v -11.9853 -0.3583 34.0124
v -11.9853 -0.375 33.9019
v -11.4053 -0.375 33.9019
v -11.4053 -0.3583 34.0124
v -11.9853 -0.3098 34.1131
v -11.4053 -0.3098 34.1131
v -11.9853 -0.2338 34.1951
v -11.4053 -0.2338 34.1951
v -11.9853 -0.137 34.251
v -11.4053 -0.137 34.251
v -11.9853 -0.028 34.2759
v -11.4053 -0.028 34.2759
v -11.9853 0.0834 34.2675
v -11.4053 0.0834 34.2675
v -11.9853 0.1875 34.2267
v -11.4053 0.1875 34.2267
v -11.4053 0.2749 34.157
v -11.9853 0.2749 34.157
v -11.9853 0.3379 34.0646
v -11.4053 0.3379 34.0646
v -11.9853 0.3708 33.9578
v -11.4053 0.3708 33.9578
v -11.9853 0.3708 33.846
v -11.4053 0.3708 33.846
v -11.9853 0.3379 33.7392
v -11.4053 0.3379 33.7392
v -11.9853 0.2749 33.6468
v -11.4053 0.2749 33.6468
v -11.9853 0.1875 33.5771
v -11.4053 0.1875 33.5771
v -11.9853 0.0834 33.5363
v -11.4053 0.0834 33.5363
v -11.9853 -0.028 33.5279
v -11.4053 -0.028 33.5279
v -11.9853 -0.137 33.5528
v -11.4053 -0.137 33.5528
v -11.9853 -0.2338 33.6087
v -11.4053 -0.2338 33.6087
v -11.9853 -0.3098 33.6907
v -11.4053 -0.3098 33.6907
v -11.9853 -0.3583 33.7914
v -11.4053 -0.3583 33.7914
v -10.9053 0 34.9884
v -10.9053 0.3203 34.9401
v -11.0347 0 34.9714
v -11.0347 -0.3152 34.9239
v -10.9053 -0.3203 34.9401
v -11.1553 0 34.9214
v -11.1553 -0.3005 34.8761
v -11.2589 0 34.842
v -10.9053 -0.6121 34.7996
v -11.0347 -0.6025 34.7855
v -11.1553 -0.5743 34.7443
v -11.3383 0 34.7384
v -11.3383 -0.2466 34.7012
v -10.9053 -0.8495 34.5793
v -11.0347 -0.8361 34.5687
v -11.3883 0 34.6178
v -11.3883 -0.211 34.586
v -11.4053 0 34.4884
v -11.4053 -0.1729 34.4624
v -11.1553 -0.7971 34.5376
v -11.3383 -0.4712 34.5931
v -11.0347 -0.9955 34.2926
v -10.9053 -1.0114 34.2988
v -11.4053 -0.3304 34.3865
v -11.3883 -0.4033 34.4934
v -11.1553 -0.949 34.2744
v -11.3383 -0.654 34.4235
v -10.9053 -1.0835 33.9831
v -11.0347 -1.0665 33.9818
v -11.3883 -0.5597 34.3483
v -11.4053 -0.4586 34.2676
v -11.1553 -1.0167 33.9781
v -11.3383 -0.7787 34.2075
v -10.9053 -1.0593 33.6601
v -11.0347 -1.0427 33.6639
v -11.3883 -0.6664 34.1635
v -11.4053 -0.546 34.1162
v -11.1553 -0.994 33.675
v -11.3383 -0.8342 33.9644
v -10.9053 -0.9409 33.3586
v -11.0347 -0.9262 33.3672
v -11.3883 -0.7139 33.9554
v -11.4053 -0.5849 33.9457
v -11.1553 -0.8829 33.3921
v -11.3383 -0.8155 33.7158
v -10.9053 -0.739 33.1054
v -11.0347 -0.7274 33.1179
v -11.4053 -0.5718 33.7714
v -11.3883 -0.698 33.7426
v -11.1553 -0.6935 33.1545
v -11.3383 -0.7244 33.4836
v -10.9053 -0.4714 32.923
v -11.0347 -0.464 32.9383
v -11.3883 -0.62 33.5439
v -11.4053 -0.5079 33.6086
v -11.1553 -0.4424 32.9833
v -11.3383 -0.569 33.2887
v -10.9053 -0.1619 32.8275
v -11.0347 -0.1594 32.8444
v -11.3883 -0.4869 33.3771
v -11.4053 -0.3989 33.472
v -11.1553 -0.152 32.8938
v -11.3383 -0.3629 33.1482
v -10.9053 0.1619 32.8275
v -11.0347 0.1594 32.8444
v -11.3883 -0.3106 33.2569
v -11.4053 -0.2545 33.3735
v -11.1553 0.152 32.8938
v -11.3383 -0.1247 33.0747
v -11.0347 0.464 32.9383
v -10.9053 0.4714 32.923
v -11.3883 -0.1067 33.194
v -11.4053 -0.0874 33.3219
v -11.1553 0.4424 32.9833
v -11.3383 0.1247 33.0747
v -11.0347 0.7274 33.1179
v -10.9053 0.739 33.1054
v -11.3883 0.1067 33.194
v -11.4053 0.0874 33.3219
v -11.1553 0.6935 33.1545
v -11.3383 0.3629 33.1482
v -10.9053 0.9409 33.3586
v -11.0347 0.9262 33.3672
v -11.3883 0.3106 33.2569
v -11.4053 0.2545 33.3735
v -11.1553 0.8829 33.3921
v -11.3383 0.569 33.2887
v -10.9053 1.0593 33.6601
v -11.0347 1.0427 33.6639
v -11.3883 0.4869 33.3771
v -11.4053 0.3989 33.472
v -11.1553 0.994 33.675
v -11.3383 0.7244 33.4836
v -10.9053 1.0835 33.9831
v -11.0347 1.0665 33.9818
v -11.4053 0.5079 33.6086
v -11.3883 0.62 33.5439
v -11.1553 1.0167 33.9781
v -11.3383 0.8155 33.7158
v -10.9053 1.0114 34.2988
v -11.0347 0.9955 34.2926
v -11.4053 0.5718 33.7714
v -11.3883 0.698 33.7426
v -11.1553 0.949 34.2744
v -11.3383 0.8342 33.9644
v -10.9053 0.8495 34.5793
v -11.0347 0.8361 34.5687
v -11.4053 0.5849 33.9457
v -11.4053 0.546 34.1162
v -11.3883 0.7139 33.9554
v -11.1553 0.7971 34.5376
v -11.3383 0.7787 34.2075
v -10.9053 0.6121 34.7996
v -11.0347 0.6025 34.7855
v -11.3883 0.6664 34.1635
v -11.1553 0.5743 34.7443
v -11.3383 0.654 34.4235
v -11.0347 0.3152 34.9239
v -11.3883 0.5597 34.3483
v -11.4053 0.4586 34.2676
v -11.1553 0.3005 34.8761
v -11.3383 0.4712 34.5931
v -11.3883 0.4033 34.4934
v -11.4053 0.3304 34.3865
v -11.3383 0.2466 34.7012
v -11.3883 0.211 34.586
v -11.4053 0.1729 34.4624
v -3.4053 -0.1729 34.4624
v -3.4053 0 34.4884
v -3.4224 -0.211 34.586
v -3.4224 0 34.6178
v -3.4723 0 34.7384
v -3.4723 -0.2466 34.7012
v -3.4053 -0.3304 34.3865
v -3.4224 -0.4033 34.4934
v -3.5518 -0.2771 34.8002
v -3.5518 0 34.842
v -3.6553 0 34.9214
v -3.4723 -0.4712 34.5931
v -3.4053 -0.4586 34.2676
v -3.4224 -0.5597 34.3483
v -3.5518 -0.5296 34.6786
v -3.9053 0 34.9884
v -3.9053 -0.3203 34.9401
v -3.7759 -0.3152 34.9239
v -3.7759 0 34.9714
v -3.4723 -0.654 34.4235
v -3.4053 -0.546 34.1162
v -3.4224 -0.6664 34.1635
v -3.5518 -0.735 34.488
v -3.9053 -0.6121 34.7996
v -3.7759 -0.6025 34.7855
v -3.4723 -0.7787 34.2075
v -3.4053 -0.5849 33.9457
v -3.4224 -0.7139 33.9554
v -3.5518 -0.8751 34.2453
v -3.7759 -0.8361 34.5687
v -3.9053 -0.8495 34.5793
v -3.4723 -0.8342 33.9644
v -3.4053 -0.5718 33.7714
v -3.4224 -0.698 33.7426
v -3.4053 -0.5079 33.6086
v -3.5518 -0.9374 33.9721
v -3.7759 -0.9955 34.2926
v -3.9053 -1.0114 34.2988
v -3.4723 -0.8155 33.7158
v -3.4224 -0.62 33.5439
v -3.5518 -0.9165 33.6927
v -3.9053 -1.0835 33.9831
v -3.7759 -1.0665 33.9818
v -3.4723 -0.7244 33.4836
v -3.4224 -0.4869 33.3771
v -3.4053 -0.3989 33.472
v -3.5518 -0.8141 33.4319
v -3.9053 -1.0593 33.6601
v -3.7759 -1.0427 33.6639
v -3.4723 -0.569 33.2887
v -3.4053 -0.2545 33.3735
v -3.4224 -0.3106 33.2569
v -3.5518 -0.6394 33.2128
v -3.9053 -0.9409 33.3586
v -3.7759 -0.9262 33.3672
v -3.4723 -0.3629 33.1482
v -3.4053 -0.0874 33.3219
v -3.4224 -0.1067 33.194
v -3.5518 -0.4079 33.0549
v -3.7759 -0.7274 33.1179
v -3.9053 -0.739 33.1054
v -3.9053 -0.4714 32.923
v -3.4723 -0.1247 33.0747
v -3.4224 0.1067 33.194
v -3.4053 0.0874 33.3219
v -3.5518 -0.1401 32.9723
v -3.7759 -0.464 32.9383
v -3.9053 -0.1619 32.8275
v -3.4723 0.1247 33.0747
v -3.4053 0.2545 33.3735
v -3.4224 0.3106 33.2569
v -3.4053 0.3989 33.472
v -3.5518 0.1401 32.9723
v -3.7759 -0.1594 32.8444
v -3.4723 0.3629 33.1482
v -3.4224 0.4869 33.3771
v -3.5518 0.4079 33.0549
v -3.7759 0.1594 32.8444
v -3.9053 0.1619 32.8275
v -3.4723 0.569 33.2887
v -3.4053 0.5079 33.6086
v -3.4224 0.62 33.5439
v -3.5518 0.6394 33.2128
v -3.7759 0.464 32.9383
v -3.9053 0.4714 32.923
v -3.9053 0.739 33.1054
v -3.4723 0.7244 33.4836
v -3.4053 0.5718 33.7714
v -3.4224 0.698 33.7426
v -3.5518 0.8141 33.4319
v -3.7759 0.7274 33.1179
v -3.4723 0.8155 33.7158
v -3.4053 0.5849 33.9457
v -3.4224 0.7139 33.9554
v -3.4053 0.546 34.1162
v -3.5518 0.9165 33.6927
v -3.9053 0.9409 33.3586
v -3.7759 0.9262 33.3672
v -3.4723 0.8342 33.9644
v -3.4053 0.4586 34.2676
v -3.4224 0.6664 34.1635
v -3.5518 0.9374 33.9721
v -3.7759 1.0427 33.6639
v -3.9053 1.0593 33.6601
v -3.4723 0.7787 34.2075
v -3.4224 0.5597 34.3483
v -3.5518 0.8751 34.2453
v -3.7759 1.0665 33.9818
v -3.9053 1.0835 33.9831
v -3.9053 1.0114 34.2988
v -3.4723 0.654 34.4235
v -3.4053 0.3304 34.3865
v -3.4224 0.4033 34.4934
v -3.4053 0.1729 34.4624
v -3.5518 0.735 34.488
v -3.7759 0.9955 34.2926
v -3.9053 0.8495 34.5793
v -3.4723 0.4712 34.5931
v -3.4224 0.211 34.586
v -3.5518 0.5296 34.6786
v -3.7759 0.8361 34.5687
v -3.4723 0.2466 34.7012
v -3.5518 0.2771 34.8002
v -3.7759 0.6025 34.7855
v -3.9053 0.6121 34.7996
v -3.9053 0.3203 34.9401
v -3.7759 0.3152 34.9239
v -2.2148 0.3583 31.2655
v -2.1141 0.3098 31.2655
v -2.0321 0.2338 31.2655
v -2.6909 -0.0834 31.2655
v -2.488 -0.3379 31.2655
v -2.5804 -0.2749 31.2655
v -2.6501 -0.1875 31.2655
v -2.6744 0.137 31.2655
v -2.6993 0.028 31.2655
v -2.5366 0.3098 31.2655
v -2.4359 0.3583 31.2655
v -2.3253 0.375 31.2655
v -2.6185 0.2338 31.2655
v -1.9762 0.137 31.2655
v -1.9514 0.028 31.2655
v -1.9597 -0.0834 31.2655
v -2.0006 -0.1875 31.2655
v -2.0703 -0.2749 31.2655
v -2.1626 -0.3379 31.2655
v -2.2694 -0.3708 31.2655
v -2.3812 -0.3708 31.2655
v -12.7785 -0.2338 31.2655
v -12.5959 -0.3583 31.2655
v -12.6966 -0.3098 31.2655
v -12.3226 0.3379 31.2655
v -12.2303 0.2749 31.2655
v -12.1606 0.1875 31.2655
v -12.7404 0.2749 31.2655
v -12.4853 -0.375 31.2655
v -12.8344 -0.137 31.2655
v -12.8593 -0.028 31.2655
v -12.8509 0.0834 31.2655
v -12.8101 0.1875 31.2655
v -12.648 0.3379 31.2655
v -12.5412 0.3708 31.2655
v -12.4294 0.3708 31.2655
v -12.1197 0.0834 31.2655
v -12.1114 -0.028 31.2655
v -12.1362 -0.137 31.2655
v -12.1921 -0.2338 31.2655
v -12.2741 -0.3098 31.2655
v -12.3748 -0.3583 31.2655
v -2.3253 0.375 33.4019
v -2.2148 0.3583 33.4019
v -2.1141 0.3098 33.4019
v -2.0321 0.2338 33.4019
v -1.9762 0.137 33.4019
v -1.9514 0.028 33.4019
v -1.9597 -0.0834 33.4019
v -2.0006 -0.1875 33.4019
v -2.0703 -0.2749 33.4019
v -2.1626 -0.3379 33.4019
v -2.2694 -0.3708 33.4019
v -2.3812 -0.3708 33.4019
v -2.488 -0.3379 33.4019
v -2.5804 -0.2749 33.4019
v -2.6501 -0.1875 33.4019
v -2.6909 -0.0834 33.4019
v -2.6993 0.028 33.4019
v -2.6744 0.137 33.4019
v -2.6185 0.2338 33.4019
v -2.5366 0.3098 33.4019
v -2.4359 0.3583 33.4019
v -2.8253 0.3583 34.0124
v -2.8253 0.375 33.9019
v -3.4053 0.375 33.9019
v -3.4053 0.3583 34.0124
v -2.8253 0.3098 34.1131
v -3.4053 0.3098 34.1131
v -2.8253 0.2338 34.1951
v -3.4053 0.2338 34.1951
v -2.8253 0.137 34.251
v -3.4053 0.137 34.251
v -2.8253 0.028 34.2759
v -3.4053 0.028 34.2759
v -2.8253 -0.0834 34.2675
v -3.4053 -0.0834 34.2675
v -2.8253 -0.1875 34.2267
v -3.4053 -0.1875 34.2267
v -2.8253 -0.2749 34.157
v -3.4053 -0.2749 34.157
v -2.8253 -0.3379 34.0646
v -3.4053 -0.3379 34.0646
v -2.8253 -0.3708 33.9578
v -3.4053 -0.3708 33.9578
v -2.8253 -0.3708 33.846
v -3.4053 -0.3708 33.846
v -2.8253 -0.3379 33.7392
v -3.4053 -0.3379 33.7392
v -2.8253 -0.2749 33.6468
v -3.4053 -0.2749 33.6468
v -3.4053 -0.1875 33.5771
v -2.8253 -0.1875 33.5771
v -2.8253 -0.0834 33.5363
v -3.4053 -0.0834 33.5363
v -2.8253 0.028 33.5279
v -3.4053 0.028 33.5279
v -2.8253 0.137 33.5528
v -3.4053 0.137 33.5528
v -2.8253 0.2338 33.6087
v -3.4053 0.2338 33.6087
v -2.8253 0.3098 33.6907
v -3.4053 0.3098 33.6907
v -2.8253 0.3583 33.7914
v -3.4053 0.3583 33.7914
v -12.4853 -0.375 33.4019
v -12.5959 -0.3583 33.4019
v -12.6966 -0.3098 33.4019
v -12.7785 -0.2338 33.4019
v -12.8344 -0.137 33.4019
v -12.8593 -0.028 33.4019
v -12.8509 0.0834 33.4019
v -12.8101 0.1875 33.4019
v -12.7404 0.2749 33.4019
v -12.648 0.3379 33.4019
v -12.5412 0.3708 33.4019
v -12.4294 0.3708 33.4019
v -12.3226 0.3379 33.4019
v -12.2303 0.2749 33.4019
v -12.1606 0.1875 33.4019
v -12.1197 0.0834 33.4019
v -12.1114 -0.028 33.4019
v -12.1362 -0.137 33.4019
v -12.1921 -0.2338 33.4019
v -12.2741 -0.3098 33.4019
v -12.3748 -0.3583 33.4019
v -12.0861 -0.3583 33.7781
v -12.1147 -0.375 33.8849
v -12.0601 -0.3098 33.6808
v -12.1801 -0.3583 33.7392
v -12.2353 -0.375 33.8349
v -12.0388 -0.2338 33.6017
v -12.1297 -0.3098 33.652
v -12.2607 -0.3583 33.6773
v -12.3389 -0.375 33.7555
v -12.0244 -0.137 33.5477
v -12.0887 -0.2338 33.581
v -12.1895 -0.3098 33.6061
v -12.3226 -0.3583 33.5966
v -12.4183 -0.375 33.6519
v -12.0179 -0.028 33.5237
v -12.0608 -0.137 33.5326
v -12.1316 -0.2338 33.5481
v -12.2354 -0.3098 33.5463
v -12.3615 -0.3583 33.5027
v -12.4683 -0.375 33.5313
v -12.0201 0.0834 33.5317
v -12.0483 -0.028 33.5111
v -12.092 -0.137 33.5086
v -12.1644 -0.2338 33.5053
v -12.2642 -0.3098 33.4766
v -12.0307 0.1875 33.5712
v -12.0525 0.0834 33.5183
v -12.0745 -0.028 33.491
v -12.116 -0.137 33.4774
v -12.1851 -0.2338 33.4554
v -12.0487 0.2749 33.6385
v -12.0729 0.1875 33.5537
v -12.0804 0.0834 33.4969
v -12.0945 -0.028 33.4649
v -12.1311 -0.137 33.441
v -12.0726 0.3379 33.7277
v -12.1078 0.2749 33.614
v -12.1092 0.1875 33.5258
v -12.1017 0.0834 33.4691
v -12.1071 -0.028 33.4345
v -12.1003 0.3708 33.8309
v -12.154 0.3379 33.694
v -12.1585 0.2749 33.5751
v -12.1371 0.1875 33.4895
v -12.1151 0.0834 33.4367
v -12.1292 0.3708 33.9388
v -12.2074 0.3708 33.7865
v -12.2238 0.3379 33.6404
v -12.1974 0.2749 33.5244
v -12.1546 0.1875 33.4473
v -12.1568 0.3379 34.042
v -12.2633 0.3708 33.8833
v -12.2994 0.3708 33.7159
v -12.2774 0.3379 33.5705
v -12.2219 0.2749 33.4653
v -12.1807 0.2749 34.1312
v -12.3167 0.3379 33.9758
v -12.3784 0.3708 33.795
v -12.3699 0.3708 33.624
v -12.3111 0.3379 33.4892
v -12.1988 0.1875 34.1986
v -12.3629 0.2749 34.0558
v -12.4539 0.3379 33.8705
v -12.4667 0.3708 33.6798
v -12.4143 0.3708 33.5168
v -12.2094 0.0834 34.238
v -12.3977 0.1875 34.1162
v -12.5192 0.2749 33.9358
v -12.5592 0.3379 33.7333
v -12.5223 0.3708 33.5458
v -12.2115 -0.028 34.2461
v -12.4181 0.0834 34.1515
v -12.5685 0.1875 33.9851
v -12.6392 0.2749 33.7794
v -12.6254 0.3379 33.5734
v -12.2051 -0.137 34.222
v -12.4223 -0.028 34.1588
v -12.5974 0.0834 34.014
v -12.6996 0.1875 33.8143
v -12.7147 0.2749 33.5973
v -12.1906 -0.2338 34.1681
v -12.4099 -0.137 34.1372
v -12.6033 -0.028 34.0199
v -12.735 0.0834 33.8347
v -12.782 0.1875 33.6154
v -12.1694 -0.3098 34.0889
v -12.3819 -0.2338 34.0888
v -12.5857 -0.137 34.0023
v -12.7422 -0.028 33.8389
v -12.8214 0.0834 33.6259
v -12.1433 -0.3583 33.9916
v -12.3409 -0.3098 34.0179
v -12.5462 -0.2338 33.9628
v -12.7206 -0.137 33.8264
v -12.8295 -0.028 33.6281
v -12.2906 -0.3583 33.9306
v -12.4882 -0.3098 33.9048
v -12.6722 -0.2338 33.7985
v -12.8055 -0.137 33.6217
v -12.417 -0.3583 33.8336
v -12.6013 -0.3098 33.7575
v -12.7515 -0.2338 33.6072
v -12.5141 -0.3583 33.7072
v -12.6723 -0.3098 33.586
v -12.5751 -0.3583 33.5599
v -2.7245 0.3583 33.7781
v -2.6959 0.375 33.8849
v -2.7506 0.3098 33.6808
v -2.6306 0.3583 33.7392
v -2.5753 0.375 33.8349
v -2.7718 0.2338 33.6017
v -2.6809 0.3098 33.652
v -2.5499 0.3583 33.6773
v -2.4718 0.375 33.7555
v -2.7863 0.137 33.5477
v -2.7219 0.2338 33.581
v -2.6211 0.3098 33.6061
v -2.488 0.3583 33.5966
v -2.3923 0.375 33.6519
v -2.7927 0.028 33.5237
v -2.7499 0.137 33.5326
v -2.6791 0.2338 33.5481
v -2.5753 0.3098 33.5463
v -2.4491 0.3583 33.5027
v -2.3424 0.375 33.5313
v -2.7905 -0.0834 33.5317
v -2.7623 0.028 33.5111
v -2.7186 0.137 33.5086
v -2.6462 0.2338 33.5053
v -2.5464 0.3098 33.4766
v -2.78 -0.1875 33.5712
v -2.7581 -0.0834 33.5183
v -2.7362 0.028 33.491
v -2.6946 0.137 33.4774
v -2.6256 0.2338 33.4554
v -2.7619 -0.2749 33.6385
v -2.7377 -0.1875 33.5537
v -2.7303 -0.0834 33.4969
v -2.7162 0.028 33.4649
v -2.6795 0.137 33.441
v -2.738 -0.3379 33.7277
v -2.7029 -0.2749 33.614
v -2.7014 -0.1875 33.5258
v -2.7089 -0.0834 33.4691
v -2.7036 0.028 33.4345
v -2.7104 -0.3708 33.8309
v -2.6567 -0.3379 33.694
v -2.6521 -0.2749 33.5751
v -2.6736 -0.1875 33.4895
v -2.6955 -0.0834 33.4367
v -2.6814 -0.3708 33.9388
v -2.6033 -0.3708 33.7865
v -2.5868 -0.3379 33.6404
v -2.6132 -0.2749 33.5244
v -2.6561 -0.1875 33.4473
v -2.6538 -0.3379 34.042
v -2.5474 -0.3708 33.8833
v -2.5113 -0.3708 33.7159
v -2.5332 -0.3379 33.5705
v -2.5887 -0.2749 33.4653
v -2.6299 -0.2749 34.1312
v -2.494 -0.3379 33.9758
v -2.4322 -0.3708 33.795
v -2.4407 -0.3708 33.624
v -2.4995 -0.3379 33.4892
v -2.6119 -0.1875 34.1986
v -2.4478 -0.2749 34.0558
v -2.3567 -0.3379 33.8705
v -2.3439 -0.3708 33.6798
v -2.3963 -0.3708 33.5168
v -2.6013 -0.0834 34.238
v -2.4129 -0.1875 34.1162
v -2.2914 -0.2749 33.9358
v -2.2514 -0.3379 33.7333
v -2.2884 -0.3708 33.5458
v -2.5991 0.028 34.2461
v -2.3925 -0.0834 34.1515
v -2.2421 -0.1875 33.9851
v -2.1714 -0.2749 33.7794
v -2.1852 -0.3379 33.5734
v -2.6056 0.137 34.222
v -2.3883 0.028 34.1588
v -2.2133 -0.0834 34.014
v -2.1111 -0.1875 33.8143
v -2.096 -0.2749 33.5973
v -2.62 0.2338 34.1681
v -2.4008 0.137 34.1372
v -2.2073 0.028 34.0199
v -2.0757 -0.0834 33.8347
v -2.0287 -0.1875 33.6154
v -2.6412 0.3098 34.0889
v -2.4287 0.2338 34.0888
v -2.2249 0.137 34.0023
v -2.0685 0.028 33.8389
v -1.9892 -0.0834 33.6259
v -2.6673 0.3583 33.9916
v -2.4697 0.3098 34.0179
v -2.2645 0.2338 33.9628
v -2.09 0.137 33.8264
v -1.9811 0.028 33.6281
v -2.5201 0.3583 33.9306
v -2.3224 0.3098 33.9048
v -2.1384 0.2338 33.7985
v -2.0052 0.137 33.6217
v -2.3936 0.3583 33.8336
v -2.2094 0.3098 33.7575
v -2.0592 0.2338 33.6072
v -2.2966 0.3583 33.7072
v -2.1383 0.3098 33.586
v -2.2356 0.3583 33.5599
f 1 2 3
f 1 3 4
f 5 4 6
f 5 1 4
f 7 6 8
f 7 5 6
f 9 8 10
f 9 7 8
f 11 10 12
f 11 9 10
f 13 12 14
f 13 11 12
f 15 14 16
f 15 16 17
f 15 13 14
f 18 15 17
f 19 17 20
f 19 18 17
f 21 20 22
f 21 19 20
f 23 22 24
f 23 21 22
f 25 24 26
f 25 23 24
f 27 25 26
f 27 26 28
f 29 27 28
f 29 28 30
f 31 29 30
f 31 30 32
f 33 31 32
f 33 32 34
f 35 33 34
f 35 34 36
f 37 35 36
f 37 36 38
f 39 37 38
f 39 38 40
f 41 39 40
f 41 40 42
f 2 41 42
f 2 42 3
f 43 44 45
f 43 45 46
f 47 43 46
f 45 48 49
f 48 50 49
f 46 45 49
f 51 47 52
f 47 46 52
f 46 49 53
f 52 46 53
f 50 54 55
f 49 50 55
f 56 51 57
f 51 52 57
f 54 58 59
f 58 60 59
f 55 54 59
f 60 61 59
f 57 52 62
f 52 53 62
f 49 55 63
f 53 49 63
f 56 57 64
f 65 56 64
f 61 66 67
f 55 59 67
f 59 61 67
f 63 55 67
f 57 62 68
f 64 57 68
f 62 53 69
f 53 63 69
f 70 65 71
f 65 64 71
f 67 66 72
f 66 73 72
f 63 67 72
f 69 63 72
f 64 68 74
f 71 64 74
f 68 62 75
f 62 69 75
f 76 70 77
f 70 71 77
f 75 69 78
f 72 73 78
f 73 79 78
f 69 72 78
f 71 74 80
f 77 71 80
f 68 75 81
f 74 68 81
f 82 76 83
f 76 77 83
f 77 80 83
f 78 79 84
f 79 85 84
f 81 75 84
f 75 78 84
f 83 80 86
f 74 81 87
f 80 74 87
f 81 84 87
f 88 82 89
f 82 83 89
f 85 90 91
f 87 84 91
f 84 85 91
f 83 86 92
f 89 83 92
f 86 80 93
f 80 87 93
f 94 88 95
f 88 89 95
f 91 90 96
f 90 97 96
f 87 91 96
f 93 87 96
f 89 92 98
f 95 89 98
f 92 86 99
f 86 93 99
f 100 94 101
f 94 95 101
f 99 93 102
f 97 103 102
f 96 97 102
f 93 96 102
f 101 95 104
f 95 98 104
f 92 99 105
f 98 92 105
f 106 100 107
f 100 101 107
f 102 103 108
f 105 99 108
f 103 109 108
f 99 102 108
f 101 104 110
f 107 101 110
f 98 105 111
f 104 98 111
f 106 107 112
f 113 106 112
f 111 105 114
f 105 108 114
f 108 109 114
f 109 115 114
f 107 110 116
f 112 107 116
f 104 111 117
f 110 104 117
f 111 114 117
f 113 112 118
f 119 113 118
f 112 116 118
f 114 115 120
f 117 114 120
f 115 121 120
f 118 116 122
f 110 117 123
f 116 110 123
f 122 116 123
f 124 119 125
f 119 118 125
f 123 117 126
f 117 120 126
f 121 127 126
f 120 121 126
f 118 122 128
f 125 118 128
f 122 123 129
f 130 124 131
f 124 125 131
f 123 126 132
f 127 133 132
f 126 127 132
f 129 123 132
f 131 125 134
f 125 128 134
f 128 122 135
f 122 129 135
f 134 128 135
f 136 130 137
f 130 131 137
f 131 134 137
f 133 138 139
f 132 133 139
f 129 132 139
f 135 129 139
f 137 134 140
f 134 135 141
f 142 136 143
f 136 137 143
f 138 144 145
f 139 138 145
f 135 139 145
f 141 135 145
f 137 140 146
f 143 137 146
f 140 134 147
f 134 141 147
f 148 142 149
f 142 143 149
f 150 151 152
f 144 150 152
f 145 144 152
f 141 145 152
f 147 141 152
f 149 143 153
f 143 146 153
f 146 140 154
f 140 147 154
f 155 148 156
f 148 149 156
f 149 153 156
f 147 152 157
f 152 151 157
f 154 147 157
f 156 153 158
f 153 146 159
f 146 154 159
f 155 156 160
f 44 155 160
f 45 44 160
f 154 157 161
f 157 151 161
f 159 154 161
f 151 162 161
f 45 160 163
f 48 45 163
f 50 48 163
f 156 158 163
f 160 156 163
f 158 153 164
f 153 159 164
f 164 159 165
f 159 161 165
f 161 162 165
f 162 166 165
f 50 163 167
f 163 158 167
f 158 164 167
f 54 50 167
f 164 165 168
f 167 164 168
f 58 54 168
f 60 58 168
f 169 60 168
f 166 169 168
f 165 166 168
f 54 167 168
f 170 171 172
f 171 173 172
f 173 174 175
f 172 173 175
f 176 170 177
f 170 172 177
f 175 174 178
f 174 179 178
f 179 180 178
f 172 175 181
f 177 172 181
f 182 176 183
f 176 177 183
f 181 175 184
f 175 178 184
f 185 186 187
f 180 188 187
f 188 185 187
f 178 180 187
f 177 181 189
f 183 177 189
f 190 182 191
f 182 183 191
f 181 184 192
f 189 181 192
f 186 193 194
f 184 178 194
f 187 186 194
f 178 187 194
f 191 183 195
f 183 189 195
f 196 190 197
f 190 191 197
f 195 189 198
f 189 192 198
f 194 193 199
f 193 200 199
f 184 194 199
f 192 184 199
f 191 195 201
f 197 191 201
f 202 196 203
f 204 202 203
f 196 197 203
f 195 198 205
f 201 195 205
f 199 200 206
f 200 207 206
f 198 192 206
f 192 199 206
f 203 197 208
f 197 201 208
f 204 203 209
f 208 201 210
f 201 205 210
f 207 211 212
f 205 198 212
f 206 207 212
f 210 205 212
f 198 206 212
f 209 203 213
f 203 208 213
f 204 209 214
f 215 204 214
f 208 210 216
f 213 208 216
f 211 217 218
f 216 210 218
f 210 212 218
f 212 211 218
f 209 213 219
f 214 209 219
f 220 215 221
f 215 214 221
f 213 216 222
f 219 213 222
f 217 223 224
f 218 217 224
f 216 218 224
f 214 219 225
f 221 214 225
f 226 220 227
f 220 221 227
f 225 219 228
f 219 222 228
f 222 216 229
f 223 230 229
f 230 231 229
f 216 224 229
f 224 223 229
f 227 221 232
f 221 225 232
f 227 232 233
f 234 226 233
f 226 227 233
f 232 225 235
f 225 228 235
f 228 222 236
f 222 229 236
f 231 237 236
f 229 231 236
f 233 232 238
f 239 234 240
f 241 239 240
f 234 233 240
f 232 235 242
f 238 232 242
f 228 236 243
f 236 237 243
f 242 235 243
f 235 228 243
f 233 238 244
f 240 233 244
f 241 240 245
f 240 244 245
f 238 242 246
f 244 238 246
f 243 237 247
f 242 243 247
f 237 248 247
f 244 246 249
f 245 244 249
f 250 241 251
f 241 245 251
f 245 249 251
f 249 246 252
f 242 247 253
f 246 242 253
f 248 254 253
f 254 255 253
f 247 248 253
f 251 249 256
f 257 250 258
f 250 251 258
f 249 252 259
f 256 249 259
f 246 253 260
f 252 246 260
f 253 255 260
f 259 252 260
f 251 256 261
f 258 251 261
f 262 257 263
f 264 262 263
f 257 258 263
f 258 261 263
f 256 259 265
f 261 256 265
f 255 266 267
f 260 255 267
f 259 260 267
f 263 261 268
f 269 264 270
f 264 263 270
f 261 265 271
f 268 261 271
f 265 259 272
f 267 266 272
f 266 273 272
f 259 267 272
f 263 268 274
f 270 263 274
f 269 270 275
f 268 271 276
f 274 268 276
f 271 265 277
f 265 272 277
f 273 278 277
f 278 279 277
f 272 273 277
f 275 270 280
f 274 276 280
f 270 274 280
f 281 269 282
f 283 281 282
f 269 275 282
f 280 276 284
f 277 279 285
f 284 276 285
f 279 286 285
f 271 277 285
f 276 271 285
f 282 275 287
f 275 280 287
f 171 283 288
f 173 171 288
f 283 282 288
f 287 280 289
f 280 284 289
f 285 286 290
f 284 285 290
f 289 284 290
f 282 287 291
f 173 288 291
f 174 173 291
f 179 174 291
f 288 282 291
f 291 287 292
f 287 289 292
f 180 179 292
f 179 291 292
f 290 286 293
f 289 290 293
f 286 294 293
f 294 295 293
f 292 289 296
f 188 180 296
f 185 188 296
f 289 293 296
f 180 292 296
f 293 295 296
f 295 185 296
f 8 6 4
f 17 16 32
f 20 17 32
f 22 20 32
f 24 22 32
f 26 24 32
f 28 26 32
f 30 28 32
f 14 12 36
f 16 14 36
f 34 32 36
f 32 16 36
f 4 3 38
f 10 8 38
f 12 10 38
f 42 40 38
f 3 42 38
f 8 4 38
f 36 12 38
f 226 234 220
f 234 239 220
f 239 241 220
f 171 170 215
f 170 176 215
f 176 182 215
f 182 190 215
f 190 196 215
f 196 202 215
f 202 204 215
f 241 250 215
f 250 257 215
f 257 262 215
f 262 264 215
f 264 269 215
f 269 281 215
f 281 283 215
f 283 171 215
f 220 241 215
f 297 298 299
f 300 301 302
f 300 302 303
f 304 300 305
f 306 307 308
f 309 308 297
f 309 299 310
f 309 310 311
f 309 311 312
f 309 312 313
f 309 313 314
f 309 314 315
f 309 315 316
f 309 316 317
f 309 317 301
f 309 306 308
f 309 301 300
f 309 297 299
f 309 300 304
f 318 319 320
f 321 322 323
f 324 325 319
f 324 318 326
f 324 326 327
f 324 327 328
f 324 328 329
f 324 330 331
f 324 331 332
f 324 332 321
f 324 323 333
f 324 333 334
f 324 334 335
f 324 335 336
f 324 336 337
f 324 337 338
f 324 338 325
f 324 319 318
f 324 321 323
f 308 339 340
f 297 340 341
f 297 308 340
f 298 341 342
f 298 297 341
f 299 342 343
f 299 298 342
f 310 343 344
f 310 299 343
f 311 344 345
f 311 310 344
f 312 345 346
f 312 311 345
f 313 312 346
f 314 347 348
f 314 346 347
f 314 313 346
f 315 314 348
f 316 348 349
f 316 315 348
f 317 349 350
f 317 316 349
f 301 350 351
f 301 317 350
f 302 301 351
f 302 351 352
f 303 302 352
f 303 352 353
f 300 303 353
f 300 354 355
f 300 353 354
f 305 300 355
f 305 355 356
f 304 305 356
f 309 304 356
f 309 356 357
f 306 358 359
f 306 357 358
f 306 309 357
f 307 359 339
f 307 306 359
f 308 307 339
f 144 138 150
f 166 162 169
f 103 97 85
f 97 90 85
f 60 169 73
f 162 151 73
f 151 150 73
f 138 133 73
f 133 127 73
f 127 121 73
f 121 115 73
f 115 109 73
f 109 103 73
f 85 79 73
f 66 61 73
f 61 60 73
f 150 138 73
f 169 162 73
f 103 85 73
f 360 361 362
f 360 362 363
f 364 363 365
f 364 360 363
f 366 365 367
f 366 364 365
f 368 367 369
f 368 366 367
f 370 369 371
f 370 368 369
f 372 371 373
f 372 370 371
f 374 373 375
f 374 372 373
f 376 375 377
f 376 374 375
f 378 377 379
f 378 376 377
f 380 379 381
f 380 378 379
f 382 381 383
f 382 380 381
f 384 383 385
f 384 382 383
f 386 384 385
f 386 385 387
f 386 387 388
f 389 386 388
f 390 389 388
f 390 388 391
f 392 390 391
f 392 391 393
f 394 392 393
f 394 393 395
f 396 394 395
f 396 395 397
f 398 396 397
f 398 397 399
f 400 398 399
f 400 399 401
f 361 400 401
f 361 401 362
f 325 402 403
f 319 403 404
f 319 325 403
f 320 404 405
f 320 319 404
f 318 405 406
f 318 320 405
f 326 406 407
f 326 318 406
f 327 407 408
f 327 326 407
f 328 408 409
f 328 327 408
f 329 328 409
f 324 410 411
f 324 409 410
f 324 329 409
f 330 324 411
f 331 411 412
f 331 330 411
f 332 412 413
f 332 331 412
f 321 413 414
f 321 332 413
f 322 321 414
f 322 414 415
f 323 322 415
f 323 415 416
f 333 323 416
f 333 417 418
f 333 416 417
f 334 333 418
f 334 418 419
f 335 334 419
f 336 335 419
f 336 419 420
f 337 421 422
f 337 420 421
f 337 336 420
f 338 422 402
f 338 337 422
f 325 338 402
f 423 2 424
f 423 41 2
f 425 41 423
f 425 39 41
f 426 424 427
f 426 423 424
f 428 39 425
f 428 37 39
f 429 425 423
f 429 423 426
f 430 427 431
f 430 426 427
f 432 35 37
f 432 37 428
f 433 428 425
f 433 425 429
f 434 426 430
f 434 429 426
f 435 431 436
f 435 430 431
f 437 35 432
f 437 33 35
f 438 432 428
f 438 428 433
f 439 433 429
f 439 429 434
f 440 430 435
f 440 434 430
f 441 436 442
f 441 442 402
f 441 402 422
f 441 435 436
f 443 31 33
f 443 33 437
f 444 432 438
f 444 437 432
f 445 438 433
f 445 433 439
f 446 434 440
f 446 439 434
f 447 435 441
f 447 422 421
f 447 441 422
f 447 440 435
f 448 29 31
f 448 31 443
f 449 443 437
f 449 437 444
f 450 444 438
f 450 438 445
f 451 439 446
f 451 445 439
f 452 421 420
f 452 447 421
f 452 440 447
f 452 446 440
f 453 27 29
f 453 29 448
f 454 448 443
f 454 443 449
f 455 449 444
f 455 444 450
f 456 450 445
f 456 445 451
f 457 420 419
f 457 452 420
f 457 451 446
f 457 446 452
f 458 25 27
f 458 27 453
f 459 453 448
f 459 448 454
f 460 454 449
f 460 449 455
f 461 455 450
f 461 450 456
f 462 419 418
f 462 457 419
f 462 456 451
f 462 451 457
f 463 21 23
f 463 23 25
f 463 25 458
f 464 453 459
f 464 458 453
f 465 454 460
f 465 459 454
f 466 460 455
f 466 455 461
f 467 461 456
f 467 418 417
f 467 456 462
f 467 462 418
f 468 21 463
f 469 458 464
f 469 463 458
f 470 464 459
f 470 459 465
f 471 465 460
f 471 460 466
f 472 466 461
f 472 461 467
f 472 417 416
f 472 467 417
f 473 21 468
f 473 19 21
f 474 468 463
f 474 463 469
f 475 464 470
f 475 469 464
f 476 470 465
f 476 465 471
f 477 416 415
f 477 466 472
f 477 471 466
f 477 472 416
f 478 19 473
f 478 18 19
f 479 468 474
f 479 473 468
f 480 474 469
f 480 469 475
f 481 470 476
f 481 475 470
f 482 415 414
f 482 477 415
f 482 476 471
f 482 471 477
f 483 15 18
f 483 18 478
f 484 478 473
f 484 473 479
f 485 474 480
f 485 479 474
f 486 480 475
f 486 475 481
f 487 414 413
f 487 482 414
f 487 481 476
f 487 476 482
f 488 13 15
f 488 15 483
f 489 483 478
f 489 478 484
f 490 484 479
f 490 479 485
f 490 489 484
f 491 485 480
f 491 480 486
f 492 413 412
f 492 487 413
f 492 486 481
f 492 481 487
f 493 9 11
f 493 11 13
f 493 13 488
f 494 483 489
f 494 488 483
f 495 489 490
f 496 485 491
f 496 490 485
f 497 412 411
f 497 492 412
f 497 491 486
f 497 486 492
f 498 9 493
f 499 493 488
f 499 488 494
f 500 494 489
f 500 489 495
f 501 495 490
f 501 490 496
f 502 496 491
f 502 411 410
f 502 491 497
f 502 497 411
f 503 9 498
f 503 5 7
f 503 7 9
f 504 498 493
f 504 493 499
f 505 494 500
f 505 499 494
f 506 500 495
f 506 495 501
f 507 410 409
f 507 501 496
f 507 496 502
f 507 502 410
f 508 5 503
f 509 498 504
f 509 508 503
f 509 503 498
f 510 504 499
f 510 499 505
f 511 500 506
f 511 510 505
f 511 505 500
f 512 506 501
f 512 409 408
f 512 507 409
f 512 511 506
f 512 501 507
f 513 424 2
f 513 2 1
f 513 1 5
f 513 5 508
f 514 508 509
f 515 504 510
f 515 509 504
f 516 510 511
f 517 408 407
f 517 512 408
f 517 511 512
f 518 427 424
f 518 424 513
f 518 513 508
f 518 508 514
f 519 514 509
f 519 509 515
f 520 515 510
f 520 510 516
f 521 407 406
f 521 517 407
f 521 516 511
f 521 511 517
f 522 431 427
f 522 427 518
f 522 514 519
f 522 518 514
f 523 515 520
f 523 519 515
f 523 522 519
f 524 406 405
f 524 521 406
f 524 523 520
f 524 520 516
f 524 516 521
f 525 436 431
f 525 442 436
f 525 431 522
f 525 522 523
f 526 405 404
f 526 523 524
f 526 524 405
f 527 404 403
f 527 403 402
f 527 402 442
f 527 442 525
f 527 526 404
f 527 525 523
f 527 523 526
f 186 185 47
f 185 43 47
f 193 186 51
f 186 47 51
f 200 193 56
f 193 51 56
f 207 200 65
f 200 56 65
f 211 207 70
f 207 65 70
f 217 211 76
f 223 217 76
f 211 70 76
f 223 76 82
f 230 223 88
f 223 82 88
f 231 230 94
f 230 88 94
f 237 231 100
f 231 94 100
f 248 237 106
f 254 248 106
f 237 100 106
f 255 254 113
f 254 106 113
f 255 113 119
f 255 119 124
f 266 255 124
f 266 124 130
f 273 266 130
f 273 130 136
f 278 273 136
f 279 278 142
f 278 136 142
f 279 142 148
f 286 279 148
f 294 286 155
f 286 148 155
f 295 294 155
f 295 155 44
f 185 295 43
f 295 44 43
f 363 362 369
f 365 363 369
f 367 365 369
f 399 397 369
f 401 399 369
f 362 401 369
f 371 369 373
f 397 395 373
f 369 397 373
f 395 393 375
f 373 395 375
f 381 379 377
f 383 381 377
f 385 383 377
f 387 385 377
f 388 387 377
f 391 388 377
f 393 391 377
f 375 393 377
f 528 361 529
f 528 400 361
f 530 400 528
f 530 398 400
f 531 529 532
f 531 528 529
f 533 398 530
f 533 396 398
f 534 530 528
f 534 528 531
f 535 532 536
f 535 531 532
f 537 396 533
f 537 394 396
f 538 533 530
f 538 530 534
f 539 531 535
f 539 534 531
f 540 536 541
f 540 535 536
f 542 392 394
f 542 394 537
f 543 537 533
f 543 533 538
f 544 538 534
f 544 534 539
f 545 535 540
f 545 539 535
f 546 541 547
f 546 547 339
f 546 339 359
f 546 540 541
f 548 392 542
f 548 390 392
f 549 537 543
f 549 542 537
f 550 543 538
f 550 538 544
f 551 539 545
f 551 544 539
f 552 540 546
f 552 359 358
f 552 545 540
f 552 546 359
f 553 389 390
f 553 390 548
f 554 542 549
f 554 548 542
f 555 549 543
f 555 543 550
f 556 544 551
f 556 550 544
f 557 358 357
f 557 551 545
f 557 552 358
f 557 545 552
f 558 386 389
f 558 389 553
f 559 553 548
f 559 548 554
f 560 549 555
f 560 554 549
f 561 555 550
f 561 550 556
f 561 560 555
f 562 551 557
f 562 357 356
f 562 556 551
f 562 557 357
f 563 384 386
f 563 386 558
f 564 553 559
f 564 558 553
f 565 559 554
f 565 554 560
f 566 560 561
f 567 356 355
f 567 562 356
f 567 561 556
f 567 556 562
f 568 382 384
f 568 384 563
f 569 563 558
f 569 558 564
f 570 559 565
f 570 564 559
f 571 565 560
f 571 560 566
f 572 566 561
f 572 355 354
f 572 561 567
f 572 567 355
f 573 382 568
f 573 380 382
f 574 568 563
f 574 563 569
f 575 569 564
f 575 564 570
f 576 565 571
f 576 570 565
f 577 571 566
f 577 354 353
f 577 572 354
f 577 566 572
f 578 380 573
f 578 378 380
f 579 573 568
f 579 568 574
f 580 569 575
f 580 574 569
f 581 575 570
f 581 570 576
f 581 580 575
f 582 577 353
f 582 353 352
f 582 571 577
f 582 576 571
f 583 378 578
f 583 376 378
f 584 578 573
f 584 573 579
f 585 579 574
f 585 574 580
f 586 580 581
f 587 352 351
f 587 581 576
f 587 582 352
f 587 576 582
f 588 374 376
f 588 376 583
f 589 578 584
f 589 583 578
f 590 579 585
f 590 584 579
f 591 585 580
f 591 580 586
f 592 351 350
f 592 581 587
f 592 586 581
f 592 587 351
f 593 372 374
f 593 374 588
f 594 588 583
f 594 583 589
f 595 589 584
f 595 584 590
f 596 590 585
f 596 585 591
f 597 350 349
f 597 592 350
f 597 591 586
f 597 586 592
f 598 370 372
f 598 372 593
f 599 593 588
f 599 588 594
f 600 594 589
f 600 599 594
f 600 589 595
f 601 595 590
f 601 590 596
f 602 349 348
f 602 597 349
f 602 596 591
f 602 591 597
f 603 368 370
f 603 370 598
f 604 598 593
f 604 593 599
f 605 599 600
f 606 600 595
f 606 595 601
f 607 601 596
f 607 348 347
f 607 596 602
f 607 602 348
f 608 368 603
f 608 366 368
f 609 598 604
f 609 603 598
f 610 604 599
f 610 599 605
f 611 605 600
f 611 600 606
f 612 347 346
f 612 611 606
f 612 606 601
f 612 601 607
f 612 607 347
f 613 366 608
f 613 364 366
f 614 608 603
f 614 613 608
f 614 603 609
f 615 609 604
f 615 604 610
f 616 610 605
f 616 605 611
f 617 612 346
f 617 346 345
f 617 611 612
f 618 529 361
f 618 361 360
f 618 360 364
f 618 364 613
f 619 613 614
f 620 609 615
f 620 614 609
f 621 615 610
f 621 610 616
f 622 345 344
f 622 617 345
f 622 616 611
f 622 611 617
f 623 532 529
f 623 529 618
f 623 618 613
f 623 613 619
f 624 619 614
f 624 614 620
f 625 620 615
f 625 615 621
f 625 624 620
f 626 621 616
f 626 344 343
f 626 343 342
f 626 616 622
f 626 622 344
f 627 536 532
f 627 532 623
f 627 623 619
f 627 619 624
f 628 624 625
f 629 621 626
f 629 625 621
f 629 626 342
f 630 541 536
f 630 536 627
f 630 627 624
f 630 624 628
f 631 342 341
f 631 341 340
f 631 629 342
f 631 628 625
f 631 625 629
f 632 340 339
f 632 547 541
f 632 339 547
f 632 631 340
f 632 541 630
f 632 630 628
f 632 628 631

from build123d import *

# Parameters (mm, degrees)
F1_FACE_R = 0.5865084266
F3_R      = 0.375
F5_R      = 0.375


with BuildPart() as f1:
    # F0 (on Front) → F1 (revolve)
    with BuildSketch(Plane.XZ):
        with BuildLine():
            Line((-11.4053217933, 34.4884074648), (-11.4053217933, 33.9018990382))
            Line((-11.4053217933, 33.9018990382), (-3.4053217933, 33.9018990382))
            Line((-3.4053217933, 33.9018990382), (-3.4053217933, 34.4884074648))
            ThreePointArc((-3.4053217933, 34.4884074648), (-3.5517684027, 34.8419608554), (-3.9053217933, 34.9884074648))
            Line((-3.9053217933, 34.9884074648), (-10.9053217933, 34.9884074648))
            ThreePointArc((-10.9053217933, 34.9884074648), (-11.2588751839, 34.8419608554), (-11.4053217933, 34.4884074648))
        make_face()
    revolve(axis=Axis((-7.1268200491, 0, 33.9018990382), (1, 0, 0)))

    # F2: sweep along a path in F0
    with BuildLine(Plane.XZ) as f2_path:
        Line((-11.4053217933, 33.9018990382), (-11.9853217933, 33.9018990382))
    # F1_face (on face) → F2 (sweep, cut)
    with BuildSketch(Plane(origin=(-11.4053217933, 0, 33.9018990382), x_dir=(0, -1, 0), z_dir=(-1, 0, 0))):
        Circle(F1_FACE_R)
    sweep(path=f2_path.line, mode=Mode.SUBTRACT)


with BuildPart() as f4:
    # F4: sweep along a path in F0
    with BuildLine(Plane.XZ) as f4_path:
        Line((-11.4053217933, 33.9018990382), (-11.9853217933, 33.9018990382))
        ThreePointArc((-11.9853217933, 33.9018990382), (-12.3388751839, 33.7554524288), (-12.4853217933, 33.4018990382))
        Line((-12.4853217933, 33.4018990382), (-12.4853217933, 31.2655232847))
    # F3 (on face) → F4 (sweep)
    with BuildSketch(Plane(origin=(-11.4053217933, 0, 0), x_dir=(0, -1, 0), z_dir=(-1, 0, 0))):
        with Locations((0, 33.9018990382)):
            Circle(F3_R)
    sweep(path=f4_path.line)


with BuildPart() as f6:
    # F6: sweep along a path in F0
    with BuildLine(Plane.XZ) as f6_path:
        Line((-3.4053217933, 33.9018990382), (-2.8253217933, 33.9018990382))
        ThreePointArc((-2.8253217933, 33.9018990382), (-2.4717684027, 33.7554524288), (-2.3253217933, 33.4018990382))
        Line((-2.3253217933, 33.4018990382), (-2.3253217933, 31.2655232847))
    # F5 (on face) → F6 (sweep)
    with BuildSketch(Plane.YZ.offset(-3.4053217933)):
        with Locations((0, 33.9018990382)):
            Circle(F5_R)
    sweep(path=f6_path.line)


solid = Compound([f1.part, f4.part, f6.part])
